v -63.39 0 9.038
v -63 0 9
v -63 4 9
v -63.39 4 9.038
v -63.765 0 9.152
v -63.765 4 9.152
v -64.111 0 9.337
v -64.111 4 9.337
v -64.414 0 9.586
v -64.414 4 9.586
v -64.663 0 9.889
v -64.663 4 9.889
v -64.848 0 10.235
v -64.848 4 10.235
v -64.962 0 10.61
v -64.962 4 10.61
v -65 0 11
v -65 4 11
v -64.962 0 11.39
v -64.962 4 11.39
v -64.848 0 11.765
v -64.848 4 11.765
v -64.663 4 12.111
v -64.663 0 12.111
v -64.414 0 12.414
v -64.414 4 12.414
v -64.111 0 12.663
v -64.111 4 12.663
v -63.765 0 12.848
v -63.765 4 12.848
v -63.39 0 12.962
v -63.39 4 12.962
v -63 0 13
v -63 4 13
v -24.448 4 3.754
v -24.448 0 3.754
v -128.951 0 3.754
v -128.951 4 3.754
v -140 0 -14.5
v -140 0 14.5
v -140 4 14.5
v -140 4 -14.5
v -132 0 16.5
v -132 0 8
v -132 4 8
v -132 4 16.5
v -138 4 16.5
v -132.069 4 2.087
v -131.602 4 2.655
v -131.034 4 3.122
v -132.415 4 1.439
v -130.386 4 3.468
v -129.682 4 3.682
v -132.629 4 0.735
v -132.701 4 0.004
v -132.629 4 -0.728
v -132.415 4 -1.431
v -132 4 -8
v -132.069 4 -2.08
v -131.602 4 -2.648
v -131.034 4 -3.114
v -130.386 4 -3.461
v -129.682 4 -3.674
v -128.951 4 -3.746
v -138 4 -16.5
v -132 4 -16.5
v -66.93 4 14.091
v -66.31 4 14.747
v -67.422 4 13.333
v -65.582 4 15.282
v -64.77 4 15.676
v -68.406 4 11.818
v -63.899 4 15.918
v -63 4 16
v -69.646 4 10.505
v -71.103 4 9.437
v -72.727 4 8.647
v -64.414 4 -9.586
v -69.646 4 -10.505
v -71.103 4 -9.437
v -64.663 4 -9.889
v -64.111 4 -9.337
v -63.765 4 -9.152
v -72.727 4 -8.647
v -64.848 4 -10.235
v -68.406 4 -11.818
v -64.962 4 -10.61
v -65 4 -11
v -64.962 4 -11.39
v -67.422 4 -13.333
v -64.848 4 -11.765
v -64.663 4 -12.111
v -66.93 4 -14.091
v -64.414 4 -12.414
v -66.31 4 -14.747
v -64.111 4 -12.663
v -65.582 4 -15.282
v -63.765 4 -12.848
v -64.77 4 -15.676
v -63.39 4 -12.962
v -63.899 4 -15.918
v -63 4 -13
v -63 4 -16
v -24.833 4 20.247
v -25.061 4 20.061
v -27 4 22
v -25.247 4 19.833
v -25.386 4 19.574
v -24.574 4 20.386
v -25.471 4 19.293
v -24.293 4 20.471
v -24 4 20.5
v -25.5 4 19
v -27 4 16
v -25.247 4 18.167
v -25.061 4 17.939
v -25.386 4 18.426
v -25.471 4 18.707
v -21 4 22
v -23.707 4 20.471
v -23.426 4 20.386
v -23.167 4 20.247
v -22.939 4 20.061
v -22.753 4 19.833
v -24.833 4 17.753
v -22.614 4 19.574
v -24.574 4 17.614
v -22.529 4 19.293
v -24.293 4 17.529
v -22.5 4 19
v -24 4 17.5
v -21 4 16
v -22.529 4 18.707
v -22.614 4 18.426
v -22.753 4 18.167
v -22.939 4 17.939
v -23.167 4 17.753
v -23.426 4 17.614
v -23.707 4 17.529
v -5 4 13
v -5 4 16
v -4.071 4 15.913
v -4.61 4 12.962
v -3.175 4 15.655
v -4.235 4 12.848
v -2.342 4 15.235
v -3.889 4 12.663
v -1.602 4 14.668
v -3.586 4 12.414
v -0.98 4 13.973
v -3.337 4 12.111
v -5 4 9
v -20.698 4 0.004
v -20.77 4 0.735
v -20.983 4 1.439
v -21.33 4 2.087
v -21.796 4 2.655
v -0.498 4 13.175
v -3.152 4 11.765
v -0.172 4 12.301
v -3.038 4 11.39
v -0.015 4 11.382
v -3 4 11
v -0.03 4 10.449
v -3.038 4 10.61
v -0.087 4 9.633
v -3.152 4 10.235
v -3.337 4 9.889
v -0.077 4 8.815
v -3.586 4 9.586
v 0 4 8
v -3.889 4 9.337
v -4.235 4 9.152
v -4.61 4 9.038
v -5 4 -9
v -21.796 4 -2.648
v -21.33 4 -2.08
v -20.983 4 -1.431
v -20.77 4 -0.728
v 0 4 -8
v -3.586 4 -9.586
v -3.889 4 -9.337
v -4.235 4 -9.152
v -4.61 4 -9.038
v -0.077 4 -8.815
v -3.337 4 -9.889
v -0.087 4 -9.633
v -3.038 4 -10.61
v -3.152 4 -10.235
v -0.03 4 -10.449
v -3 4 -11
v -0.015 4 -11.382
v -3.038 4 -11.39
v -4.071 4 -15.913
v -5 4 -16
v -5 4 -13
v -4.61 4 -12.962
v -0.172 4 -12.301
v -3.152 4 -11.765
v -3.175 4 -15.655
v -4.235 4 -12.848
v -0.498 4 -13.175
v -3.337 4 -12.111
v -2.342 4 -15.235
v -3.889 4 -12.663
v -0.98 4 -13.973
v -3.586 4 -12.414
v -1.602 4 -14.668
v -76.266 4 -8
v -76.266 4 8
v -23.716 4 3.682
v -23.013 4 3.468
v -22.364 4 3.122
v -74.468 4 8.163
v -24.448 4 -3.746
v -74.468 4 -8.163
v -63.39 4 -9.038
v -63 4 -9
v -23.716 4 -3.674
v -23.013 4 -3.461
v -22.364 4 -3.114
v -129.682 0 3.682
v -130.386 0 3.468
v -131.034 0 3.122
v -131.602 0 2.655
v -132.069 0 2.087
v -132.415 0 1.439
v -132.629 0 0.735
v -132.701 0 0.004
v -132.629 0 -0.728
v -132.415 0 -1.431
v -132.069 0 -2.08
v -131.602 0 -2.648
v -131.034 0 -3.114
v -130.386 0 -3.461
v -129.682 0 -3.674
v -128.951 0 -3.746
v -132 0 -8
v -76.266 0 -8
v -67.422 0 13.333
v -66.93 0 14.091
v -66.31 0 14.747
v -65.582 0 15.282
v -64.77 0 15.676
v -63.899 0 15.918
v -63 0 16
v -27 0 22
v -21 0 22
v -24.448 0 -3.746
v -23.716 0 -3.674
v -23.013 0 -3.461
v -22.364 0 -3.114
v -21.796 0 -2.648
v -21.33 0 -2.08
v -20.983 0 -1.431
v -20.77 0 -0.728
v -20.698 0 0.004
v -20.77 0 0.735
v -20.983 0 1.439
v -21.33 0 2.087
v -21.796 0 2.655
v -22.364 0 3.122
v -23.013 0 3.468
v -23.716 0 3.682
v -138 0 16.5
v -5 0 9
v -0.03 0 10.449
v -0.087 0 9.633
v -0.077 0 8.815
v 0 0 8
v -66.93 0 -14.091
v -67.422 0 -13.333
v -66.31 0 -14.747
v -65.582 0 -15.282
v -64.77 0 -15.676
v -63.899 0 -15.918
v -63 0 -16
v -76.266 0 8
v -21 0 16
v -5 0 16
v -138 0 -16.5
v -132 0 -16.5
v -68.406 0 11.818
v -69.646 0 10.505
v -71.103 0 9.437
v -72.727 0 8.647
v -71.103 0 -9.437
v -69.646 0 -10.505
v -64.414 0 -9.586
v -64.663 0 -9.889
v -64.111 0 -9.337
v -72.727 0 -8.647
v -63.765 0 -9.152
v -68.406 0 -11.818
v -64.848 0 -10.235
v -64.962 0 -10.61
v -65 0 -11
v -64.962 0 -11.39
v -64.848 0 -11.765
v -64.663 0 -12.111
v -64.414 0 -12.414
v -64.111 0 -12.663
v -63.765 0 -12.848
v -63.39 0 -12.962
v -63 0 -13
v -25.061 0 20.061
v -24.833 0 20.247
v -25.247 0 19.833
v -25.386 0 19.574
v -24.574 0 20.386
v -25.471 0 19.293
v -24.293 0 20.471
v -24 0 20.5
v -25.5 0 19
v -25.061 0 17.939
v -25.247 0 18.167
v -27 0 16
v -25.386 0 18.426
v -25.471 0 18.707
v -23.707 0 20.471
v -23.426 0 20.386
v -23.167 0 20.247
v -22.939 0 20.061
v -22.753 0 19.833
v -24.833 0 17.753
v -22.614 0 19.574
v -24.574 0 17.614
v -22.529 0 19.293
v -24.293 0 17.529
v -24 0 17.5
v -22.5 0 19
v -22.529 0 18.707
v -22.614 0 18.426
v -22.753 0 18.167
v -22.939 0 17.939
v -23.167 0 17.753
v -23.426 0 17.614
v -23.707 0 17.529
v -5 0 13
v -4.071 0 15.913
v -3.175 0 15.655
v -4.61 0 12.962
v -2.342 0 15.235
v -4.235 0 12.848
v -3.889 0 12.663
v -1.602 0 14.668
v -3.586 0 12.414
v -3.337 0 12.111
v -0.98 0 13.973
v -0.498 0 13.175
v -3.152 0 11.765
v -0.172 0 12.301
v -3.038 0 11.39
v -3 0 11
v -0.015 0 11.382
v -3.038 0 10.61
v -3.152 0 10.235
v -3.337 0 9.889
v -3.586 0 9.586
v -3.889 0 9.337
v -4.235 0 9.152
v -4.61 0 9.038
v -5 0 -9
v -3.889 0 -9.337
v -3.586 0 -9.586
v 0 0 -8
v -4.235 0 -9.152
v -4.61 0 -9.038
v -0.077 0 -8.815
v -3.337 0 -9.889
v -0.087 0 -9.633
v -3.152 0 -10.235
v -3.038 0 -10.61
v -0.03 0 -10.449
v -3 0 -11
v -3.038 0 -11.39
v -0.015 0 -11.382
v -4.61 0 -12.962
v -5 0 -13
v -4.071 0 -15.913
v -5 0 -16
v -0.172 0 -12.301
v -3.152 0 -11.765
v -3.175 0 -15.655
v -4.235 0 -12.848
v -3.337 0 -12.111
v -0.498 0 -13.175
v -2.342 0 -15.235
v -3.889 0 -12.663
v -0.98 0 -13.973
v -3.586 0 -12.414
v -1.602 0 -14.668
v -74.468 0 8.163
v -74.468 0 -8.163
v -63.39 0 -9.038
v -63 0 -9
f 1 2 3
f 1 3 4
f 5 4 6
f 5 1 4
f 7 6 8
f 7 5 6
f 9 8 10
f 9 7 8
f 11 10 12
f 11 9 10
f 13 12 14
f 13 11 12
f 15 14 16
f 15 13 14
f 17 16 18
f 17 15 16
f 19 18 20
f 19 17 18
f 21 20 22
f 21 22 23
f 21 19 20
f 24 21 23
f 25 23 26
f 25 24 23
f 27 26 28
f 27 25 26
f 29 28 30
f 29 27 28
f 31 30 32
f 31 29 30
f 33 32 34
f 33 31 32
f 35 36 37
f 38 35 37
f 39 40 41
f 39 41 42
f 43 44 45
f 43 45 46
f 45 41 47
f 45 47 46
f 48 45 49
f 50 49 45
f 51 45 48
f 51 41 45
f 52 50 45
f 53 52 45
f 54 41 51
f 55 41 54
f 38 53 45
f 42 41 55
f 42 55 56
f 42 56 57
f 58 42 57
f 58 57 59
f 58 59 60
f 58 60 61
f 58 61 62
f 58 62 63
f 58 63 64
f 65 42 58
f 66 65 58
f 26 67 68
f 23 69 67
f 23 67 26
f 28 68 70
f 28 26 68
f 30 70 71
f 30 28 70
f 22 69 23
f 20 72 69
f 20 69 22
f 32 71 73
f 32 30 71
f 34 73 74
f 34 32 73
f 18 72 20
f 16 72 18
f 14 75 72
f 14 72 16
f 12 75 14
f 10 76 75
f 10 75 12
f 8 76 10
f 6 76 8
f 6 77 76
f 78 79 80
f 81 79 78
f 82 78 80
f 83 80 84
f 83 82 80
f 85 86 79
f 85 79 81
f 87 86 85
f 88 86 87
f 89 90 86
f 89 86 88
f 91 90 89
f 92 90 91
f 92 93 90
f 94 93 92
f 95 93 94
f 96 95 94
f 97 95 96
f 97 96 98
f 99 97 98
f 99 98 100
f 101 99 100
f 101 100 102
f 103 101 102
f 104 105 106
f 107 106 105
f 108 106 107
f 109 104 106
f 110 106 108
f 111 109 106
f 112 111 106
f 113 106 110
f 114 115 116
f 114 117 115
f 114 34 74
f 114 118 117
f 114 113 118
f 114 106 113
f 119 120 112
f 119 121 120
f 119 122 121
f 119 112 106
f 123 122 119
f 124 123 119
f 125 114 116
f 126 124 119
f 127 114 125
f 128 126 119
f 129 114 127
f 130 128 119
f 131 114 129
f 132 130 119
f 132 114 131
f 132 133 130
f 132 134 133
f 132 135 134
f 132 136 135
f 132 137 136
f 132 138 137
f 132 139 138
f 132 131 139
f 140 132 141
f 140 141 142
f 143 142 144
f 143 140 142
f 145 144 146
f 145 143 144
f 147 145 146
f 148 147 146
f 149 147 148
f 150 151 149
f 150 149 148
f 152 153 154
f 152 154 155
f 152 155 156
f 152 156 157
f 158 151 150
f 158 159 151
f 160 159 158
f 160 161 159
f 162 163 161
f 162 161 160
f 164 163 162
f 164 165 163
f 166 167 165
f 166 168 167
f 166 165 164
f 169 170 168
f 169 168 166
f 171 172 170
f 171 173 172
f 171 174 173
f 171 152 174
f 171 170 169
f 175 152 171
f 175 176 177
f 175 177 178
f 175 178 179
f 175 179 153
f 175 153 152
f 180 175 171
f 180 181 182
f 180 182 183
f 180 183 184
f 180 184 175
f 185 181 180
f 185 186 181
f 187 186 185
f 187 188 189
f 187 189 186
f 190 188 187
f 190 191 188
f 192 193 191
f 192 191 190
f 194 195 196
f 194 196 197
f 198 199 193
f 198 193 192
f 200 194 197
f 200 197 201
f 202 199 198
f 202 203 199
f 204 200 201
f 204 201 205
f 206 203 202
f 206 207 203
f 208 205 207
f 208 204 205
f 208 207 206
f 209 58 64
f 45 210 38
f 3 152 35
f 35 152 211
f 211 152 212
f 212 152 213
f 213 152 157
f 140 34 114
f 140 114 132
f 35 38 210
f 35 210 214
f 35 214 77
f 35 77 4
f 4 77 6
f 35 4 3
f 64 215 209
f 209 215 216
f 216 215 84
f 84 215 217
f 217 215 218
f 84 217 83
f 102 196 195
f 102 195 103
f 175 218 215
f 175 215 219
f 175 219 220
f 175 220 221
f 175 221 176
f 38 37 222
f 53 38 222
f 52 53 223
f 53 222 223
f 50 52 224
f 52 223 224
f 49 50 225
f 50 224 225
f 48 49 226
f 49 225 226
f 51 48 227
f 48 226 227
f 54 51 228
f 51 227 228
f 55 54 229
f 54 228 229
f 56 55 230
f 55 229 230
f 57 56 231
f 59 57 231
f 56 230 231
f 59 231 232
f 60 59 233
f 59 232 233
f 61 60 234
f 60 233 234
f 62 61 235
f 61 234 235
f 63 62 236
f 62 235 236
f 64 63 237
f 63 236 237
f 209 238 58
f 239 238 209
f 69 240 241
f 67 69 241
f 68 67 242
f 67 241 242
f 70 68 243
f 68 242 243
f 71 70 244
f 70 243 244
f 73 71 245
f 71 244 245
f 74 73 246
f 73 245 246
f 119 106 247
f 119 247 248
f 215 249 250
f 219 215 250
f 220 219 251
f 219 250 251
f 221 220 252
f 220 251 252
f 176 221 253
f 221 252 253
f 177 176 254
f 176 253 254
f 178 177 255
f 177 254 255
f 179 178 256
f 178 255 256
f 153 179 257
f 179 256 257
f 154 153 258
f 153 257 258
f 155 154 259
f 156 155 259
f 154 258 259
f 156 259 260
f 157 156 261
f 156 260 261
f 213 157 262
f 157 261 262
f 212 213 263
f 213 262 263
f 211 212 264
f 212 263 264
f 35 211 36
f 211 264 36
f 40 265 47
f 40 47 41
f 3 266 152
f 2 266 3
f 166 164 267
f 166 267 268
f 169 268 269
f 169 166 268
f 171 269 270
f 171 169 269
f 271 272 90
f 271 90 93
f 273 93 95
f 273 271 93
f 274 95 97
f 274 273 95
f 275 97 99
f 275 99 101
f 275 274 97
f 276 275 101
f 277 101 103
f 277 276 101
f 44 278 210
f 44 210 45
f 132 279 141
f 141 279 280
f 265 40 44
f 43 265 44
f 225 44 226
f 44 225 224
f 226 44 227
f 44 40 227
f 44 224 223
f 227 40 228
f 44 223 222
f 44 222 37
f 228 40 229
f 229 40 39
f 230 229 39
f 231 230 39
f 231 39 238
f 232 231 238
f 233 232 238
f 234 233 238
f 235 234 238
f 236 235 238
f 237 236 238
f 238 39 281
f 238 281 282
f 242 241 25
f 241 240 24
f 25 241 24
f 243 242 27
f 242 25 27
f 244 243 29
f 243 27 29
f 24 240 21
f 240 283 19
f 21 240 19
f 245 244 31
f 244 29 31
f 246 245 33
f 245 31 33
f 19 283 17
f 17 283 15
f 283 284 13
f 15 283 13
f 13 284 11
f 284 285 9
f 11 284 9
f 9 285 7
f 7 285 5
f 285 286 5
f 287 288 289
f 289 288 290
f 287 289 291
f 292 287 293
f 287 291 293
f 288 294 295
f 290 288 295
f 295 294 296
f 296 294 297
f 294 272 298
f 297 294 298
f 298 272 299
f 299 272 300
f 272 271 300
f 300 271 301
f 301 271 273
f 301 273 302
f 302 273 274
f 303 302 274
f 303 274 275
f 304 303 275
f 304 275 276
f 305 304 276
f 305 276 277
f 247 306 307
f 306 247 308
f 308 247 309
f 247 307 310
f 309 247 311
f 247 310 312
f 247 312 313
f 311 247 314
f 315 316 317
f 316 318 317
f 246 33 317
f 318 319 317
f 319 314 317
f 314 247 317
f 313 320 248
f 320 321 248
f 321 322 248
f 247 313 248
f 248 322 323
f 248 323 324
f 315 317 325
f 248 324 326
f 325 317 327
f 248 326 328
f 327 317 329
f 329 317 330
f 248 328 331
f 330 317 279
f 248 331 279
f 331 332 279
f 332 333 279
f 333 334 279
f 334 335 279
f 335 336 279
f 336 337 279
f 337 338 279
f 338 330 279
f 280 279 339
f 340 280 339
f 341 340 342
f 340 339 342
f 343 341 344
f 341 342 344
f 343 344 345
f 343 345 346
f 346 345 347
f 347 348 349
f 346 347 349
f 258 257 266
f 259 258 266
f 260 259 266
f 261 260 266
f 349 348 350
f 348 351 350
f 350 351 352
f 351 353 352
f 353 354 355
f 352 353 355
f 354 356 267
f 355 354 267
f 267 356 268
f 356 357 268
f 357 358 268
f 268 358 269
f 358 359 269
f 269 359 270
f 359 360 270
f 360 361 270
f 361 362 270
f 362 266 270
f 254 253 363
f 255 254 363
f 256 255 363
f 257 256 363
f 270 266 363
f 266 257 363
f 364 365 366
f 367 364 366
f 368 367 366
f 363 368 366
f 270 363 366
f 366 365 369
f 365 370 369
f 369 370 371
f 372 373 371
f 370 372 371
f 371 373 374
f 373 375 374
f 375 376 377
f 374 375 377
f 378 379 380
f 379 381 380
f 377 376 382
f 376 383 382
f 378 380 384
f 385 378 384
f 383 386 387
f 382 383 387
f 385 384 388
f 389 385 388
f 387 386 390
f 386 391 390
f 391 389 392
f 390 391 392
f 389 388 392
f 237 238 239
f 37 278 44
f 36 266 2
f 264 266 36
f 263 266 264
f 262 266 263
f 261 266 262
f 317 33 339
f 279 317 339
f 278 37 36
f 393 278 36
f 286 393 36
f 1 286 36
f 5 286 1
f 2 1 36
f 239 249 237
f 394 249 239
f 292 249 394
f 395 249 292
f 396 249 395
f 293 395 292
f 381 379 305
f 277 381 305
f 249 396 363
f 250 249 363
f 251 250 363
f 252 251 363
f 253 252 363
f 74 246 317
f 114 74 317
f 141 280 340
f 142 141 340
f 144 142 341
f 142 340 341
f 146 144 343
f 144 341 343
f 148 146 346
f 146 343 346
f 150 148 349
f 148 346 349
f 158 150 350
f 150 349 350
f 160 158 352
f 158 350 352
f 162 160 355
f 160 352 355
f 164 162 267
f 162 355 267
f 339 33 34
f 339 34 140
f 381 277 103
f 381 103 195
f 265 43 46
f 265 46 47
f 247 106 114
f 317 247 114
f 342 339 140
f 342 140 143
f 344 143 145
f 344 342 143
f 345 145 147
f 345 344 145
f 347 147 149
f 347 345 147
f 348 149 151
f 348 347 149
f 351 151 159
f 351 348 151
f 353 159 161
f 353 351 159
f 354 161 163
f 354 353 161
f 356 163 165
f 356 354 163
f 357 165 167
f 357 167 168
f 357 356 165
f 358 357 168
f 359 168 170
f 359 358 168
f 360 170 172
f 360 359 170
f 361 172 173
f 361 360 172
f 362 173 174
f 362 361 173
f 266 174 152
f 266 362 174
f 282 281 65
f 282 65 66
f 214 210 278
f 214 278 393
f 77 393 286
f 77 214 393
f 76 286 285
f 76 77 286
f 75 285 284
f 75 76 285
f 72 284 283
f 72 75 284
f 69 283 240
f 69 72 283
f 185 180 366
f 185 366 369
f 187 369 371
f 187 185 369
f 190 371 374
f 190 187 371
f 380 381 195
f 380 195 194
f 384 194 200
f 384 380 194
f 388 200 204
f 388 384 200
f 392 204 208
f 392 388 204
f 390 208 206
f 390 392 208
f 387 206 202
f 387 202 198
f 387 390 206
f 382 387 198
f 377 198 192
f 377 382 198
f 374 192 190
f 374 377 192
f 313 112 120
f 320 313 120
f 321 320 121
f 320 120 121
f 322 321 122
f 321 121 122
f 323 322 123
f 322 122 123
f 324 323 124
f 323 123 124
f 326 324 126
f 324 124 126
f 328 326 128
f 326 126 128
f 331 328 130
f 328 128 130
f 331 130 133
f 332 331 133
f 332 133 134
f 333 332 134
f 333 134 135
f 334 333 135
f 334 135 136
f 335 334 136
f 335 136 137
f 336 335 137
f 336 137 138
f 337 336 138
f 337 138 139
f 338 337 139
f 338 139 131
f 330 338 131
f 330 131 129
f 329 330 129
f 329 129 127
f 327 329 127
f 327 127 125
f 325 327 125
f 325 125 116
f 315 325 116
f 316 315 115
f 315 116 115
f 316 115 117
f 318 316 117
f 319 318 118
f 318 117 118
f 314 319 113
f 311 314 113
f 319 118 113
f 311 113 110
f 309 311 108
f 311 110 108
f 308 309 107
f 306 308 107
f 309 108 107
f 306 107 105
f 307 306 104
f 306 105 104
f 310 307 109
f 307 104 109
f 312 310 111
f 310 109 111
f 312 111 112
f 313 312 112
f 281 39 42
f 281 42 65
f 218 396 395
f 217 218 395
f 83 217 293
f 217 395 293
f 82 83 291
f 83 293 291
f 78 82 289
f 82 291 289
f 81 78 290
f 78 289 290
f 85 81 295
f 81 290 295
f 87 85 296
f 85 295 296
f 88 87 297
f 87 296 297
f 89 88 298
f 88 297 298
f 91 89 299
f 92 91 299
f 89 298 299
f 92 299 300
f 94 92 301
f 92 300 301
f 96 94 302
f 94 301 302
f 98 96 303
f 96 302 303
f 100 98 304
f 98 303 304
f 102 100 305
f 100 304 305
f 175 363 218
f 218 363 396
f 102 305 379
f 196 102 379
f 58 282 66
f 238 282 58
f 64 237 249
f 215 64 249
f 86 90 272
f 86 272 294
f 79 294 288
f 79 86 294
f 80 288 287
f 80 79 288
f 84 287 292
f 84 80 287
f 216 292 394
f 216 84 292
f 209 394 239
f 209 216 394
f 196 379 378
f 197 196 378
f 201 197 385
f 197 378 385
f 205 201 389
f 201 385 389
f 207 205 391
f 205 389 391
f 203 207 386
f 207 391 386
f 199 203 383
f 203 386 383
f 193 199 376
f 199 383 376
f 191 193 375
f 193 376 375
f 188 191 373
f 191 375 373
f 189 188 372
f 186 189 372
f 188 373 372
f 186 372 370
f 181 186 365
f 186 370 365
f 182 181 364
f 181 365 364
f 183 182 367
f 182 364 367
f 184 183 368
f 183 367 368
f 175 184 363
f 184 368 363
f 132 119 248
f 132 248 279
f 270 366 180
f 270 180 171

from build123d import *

# Parameters (mm, degrees)
EXTRUDE_1_DEPTH     = 4
EXTRUDE_2_DEPTH     = 4
FILLET_1_R          = 10
CUT_EXTRUDE_1_DEPTH = 142.025706876
SKETCH_4_W          = 6
SKETCH_4_H          = 6
EXTRUDE_7_DEPTH     = 4
SKETCH_6_R          = 1.5
CUT_EXTRUDE_4_DEPTH = 142.774468788


with BuildPart() as part:
    # Эскиз1 → Бобышка-Вытянуть1 (new body)
    with BuildSketch(Plane(origin=(0, 0, 0), x_dir=(1, 0, 0), z_dir=(0, 1, 0))):
        Polygon((-140, -14.5), (-140, 14.5), (-138, 16.5), (-132, 16.5), (-132, 8), (0, 8), (0, -8), (-132, -8), (-132, -16.5), (-138, -16.5), align=None)
    extrude(amount=EXTRUDE_1_DEPTH)

    # Эскиз2 → Бобышка-Вытянуть2 (add)
    # profile 1 of 2: a face of its own
    with BuildSketch(Plane.XZ):
        with BuildLine():
            Line((-63, 16), (-5, 16))
            ThreePointArc((-5, 16), (0, 11), (-5, 6))
            Line((-5, 6), (-63, 6))
            ThreePointArc((-63, 6), (-68, 11), (-63, 16))
        make_face()
        with BuildLine():
            Line((-63, 13), (-5, 13))
            ThreePointArc((-5, 13), (-3, 11), (-5, 9))
            Line((-5, 9), (-63, 9))
            ThreePointArc((-63, 9), (-65, 11), (-63, 13))
        make_face(mode=Mode.SUBTRACT)
    # profile 2 of 2: a face of its own
    with BuildSketch(Plane.XZ):
        with BuildLine():
            Line((-63, -16), (-5, -16))
            ThreePointArc((-5, -16), (0, -11), (-5, -6))
            Line((-5, -6), (-63, -6))
            ThreePointArc((-63, -6), (-68, -11), (-63, -16))
        make_face()
        with BuildLine():
            Line((-63, -13), (-5, -13))
            ThreePointArc((-5, -13), (-3, -11), (-5, -9))
            Line((-5, -9), (-63, -9))
            ThreePointArc((-63, -9), (-65, -11), (-63, -13))
        make_face(mode=Mode.SUBTRACT)
    extrude(amount=-EXTRUDE_2_DEPTH)

    # Скругление1
    # the kernel refuses this fillet: 10 mm, written as the material it adds along each edge
    with BuildSketch(Plane(origin=(-1, 4, 8), x_dir=(1, 0, 0), z_dir=(0, -1, 0))) as fillet_1_piece_1:
        with BuildLine():
            CenterArc((10.90874153, 1.347902551), FILLET_1_R, 173.676623786, 14.069867748)
            Line((0.96958051, 2.44930085), (0.77079729, 2.471328816))
            ThreePointArc((0.77079729, 2.471328816), (0.463030841, 1.233264109), (-0.16, 0.12))
            Line((-0.16, 0.12), (0, -0.2))
            ThreePointArc((0, -0.2), (0.5, -0.2), (0.801825169, -0.026958051))
            Line((0.801825169, -0.026958051), (1, 0))
        make_face()
    extrude(amount=4)
    with BuildSketch(Plane(origin=(-67, 4, 8), x_dir=(-1, 0, 0), z_dir=(0, -1, 0))) as fillet_1_piece_2:
        with BuildLine():
            CenterArc((9.266499161, -10), FILLET_1_R, 90, 62.181860715)
            Line((0.422166387, -5.333333333), (0.245279732, -5.24))
            ThreePointArc((0.245279732, -5.24), (0.785032611, -2.621235013), (-0.16, -0.12))
            Line((-0.16, -0.12), (0, 0.2))
            Line((0, 0.2), (9.266499161, 0.2))
            Line((9.266499161, 0.2), (9.266499161, 0))
        make_face()
    extrude(amount=4)
    with BuildSketch(Plane(origin=(-1, 4, -8), x_dir=(1, 0, 0), z_dir=(0, -1, 0))) as fillet_1_piece_3:
        with BuildLine():
            CenterArc((10.90874153, -1.347902551), FILLET_1_R, 172.253508466, 14.069867748)
            Line((0.96958051, -2.44930085), (0.77079729, -2.471328816))
            ThreePointArc((0.77079729, -2.471328816), (0.463030841, -1.233264109), (-0.16, -0.12))
            Line((-0.16, -0.12), (0, 0.2))
            ThreePointArc((0, 0.2), (0.5, 0.2), (0.801825169, 0.026958051))
            Line((0.801825169, 0.026958051), (1, 0))
        make_face()
    extrude(amount=4)
    with BuildSketch(Plane(origin=(-67, 4, -8), x_dir=(-1, 0, 0), z_dir=(0, -1, 0))) as fillet_1_piece_4:
        with BuildLine():
            CenterArc((9.266499161, 10), FILLET_1_R, 207.818139285, 62.181860715)
            Line((0.422166387, 5.333333333), (0.245279732, 5.24))
            ThreePointArc((0.245279732, 5.24), (0.785032611, 2.621235013), (-0.16, 0.12))
            Line((-0.16, 0.12), (0, -0.2))
            Line((0, -0.2), (9.266499161, -0.2))
            Line((9.266499161, -0.2), (9.266499161, 0))
        make_face()
    extrude(amount=4)

    # Эскиз3 → Вырез-Вытянуть1 (cut, through all)
    with BuildSketch(Plane.XZ):
        with BuildLine():
            Line((-24.447568559, 3.753765504), (-128.9506377, 3.753765504))
            ThreePointArc((-128.9506377, 3.753765504), (-132.7006377, 0.003765504), (-128.9506377, -3.746234496))
            Line((-128.9506377, -3.746234496), (-24.447568559, -3.746234496))
            ThreePointArc((-24.447568559, -3.746234496), (-20.697568559, 0.003765504), (-24.447568559, 3.753765504))
        make_face()
    extrude(amount=-CUT_EXTRUDE_1_DEPTH, mode=Mode.SUBTRACT)

    # Эскиз4 → Бобышка-Вытянуть7 (add)
    with BuildSketch(Plane(origin=(0, 4, 0), x_dir=(1, 0, 0), z_dir=(0, 1, 0))):
        with Locations((-24, -19)):
            Rectangle(SKETCH_4_W, SKETCH_4_H)
    extrude(amount=-EXTRUDE_7_DEPTH)

    # Эскиз6 → Вырез-Вытянуть4 (cut, through all)
    with BuildSketch(Plane(origin=(0, 4, 0), x_dir=(1, 0, 0), z_dir=(0, 1, 0))):
        with Locations(Location((-24, -19, 0), (0, 0, 270))):
            Circle(SKETCH_6_R)
    extrude(amount=-CUT_EXTRUDE_4_DEPTH, mode=Mode.SUBTRACT)


solid = part.part
